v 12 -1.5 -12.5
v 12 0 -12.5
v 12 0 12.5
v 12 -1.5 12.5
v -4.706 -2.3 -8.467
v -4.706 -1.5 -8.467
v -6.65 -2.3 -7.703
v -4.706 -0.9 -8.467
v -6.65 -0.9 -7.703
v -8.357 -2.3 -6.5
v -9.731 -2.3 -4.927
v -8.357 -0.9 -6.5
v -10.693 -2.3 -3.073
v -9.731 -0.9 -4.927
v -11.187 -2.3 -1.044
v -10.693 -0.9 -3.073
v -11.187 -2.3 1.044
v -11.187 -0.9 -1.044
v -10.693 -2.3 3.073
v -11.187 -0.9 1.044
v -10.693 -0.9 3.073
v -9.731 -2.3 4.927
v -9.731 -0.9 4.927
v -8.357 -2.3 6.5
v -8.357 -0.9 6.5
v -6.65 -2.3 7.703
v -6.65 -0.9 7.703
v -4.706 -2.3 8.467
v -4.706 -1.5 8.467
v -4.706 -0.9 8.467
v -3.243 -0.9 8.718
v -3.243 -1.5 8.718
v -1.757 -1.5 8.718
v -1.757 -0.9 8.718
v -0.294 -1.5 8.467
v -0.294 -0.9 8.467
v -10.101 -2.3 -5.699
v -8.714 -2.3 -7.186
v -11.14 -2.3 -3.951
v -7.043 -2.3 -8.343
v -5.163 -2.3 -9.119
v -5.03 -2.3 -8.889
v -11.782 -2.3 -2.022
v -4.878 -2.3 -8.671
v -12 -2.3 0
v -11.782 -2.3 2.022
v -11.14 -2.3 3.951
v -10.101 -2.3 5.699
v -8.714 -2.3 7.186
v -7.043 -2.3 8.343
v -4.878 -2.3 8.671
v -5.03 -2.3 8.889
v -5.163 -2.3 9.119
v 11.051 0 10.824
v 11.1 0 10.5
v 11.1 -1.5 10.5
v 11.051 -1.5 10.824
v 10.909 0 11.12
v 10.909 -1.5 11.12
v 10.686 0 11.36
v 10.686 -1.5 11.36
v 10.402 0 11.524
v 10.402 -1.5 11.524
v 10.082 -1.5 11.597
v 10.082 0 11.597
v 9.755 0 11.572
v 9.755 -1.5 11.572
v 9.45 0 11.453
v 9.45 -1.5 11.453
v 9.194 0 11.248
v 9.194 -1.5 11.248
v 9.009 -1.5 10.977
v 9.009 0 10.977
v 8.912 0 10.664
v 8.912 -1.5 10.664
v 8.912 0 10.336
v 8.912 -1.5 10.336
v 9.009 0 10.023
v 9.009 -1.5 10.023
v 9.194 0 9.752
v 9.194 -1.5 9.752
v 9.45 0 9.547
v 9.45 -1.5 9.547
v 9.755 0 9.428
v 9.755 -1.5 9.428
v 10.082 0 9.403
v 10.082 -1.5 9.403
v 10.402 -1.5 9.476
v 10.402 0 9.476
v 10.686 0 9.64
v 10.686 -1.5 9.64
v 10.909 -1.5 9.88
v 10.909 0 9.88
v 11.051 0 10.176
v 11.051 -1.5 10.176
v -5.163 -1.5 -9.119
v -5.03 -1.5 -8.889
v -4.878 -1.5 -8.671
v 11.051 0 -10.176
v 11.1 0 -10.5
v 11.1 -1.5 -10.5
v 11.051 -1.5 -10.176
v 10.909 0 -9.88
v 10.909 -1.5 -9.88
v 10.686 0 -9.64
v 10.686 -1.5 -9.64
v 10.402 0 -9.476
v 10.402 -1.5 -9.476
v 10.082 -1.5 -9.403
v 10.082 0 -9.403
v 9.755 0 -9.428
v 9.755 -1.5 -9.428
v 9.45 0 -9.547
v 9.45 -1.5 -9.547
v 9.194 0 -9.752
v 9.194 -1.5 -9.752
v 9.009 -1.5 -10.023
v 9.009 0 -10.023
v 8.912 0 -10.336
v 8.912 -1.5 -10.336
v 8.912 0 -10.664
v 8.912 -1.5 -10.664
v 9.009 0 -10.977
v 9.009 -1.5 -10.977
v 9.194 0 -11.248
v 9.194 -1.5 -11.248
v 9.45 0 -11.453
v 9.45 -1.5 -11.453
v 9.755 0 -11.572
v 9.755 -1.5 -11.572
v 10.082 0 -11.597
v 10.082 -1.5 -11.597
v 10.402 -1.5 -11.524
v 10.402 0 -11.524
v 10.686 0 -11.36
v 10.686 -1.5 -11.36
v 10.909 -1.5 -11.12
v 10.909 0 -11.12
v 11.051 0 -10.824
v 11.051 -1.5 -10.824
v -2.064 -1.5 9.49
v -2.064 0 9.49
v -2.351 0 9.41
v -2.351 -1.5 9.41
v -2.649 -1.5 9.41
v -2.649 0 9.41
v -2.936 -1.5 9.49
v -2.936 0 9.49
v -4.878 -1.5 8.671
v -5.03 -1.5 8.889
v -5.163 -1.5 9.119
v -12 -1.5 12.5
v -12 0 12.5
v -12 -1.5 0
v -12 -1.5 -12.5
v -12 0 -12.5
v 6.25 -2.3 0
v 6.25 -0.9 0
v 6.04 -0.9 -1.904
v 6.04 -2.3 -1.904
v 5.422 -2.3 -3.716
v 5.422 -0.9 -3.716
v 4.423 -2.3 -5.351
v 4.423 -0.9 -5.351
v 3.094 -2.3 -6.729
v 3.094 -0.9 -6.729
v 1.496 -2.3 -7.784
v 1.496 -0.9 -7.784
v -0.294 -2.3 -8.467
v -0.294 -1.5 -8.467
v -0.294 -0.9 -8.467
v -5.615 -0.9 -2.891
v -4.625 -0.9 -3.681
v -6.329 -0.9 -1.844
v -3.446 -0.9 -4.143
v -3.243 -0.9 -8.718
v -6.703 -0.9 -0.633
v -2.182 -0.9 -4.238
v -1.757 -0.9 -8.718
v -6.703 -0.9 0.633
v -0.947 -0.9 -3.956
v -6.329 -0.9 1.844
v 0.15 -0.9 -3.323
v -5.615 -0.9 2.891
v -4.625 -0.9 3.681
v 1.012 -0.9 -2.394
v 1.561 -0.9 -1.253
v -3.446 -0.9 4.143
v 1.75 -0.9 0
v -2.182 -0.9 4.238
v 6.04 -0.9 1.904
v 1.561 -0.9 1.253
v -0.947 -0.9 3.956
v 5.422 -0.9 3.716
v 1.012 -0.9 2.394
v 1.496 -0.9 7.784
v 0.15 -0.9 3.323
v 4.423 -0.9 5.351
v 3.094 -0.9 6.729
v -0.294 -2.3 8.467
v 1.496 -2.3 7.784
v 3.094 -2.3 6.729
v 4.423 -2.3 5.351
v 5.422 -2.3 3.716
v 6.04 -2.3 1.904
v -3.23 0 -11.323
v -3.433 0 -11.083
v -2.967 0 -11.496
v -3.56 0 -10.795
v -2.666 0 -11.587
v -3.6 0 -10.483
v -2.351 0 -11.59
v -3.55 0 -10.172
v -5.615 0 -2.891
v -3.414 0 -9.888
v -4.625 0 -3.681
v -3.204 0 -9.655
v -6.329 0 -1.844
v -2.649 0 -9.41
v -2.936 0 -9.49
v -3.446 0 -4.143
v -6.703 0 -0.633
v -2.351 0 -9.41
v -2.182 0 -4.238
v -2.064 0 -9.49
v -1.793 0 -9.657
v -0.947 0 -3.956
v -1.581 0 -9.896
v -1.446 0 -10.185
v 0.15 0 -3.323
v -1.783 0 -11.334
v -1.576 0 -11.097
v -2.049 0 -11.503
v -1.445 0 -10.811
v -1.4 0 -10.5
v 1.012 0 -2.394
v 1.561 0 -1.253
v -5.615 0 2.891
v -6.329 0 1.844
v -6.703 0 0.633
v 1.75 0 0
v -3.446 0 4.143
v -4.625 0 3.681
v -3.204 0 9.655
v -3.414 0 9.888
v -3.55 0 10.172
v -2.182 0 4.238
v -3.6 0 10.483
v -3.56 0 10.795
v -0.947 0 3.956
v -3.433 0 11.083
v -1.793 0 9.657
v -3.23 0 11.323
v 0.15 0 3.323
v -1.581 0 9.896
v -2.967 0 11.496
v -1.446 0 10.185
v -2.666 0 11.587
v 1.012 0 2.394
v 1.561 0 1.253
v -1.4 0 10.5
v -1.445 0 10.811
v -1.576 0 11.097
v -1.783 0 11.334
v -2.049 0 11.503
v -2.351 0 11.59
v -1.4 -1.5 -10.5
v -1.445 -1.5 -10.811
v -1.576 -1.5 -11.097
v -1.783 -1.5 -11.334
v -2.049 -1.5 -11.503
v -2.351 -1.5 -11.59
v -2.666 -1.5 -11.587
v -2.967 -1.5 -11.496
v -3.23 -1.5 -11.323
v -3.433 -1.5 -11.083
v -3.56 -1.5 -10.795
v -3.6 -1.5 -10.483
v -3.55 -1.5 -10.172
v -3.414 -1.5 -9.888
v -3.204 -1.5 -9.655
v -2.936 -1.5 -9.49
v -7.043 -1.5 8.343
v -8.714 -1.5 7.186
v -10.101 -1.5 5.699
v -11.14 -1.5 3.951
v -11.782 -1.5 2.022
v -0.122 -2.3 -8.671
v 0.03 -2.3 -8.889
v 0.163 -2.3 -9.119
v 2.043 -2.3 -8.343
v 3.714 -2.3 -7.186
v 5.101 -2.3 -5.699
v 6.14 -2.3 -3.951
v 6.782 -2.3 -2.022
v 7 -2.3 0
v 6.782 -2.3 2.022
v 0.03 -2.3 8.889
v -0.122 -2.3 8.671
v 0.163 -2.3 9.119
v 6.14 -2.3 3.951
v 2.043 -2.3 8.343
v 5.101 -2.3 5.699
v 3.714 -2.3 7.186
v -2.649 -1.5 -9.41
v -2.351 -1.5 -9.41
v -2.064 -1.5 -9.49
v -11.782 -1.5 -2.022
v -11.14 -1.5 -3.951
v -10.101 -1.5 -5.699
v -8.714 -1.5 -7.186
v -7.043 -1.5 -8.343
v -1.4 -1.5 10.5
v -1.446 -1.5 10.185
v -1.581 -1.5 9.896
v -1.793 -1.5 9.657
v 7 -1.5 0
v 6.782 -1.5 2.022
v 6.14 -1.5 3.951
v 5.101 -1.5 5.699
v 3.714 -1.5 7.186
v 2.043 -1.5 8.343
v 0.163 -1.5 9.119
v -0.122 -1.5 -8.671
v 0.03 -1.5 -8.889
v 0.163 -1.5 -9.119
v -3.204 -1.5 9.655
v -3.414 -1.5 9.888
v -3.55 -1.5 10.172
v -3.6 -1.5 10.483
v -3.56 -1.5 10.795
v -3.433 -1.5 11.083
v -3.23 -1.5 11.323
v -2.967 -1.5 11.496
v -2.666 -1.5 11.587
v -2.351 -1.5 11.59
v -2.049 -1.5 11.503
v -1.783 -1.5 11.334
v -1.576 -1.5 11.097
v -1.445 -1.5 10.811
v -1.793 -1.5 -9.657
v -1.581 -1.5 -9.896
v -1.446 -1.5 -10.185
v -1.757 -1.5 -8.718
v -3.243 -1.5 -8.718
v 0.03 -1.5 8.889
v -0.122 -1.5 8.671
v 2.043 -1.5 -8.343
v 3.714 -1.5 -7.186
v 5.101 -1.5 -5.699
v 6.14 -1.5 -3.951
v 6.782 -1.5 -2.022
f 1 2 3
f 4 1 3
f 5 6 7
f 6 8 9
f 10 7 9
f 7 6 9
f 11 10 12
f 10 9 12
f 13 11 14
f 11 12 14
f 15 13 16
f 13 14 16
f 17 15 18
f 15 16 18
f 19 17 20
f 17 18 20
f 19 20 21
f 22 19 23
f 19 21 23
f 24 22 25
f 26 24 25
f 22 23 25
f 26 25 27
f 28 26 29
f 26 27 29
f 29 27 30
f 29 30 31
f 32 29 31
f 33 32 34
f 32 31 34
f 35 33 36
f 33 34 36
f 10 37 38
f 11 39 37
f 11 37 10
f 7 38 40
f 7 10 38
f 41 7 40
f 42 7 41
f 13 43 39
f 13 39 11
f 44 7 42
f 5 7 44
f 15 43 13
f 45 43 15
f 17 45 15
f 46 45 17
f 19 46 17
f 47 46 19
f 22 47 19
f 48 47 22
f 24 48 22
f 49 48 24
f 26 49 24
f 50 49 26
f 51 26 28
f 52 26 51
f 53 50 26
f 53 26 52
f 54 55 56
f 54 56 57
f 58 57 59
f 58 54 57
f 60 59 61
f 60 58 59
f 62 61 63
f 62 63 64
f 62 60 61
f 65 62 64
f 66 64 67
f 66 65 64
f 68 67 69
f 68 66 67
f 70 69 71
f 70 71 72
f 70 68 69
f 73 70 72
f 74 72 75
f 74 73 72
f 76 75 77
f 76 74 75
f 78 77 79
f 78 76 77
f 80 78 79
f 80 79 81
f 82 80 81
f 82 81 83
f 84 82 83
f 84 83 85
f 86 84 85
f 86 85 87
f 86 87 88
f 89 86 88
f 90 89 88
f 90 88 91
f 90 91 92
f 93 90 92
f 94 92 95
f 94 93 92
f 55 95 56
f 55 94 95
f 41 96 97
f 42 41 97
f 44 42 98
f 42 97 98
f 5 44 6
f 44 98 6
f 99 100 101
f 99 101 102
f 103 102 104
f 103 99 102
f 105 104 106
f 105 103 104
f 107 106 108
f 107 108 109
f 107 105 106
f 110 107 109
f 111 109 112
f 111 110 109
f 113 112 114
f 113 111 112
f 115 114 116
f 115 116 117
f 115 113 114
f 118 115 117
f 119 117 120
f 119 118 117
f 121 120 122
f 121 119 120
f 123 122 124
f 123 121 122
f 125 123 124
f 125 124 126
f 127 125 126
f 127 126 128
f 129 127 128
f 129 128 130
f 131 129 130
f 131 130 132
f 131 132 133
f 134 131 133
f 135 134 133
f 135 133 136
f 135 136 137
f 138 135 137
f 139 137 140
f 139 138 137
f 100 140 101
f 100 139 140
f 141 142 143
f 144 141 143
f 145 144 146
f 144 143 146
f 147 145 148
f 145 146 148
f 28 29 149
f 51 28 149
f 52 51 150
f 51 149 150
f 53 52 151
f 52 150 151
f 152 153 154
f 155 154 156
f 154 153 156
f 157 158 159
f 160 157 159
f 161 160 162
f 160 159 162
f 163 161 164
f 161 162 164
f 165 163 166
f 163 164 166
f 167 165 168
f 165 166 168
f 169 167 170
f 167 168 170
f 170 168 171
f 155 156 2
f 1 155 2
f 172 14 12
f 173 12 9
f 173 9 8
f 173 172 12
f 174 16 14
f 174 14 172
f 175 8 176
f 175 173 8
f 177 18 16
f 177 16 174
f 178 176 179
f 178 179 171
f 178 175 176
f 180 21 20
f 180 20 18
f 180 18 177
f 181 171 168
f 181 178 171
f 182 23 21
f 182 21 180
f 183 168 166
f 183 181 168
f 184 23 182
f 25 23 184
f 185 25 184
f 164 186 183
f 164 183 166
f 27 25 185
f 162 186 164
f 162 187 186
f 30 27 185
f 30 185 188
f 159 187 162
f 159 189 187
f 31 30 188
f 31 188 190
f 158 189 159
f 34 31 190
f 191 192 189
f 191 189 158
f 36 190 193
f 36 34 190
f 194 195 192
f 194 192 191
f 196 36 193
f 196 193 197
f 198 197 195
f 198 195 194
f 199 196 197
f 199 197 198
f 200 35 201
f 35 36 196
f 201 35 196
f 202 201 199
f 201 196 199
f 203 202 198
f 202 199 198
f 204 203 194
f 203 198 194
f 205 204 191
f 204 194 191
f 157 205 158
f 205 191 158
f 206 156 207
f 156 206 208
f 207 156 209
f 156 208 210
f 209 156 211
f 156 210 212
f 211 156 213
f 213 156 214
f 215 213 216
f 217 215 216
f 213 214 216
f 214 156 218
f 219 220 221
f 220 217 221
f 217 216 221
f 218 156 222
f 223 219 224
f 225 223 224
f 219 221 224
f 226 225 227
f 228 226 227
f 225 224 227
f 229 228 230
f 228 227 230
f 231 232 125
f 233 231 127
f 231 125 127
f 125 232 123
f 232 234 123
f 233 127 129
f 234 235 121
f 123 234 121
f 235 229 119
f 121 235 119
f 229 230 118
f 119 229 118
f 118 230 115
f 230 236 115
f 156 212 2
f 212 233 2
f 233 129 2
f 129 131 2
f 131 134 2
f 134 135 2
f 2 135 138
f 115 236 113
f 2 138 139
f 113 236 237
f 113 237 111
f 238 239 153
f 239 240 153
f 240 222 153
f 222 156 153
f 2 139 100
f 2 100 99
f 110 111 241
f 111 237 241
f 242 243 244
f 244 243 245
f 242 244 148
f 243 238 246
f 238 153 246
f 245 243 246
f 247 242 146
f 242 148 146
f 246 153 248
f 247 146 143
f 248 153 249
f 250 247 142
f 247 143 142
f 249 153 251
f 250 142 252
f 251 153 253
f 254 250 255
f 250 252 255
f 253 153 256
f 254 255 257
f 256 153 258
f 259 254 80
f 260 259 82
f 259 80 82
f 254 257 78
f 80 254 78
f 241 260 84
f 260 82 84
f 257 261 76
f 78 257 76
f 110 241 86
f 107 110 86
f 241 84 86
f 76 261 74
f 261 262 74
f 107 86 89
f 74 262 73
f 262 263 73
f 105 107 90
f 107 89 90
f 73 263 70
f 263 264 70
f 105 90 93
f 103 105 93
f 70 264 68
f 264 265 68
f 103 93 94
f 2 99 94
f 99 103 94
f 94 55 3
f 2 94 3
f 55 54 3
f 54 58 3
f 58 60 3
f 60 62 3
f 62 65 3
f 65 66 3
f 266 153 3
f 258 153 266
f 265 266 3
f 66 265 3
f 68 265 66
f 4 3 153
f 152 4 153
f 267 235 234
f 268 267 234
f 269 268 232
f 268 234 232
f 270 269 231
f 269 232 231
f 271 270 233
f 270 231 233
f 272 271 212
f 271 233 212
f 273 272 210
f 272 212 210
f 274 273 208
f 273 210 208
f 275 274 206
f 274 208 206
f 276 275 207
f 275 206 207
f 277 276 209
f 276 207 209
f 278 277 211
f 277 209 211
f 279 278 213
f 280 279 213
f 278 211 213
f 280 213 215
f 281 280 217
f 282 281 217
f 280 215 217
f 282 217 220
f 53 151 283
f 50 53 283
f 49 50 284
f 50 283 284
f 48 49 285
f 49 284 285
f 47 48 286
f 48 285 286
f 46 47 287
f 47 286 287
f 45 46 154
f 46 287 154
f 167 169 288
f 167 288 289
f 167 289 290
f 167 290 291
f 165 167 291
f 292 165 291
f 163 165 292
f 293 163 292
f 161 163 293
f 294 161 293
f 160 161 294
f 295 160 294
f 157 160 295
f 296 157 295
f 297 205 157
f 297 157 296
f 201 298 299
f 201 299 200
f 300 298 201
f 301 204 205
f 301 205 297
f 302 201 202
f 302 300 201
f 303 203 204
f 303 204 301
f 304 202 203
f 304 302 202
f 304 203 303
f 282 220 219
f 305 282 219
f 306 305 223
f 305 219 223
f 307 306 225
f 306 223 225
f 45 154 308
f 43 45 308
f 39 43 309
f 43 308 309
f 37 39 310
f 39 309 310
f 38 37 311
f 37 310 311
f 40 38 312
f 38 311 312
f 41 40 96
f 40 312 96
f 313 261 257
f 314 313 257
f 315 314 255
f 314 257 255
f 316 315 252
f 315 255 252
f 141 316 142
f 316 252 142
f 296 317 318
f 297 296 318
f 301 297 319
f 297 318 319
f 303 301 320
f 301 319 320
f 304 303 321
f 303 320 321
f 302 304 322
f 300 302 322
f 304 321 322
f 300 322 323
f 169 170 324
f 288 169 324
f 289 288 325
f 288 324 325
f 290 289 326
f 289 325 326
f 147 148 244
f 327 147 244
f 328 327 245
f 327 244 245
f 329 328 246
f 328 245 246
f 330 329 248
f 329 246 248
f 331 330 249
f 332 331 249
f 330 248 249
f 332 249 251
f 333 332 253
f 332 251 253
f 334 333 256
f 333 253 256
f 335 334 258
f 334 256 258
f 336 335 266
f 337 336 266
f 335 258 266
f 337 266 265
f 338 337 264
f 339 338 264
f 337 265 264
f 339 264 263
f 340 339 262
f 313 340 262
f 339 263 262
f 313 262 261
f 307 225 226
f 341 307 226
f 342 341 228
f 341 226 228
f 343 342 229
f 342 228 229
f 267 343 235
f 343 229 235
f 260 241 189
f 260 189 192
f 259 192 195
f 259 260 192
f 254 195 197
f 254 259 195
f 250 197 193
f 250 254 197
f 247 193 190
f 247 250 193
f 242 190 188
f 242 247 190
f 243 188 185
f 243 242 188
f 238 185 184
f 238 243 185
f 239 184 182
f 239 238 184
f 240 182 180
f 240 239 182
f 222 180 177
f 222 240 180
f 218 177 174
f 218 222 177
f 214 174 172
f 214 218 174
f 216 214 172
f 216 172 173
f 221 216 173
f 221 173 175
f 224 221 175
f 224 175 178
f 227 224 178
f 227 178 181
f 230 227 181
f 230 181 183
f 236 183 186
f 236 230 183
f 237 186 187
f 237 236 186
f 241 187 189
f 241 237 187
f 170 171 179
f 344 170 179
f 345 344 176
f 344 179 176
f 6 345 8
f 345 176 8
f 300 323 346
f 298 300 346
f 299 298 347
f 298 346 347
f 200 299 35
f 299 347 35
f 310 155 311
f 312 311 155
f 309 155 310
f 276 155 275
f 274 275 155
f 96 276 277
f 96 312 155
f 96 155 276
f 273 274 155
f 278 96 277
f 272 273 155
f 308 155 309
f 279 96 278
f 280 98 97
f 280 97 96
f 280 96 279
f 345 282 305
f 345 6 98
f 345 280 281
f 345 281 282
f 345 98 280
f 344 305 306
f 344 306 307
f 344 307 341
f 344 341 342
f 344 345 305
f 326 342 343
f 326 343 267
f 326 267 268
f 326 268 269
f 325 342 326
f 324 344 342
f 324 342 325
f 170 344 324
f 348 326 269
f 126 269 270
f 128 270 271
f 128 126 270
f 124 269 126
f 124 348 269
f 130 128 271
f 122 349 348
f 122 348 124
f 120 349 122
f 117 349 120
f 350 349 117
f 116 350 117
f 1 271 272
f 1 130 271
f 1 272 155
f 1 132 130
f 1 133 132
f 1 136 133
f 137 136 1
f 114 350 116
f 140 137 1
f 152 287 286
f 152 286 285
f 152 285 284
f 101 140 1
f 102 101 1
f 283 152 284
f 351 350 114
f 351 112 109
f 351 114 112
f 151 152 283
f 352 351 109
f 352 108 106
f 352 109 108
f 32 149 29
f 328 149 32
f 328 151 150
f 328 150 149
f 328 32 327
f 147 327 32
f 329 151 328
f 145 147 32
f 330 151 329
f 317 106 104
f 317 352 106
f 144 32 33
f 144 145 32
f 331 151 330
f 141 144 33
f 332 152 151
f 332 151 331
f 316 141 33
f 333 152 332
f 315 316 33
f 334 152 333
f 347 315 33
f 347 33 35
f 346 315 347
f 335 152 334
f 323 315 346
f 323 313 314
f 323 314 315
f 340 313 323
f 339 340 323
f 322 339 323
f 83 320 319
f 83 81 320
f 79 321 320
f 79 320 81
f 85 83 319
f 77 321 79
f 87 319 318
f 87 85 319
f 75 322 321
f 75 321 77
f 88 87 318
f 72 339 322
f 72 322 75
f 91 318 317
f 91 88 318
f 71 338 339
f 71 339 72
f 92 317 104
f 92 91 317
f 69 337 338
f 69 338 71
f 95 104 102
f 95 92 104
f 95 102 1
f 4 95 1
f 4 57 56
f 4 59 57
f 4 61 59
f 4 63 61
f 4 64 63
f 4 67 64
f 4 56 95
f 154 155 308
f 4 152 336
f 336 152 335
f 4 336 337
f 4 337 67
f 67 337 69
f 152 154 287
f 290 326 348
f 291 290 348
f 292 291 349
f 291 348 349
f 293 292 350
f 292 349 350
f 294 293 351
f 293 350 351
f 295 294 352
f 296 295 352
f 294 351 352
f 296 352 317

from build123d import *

# Parameters (mm, degrees)
F1_DEPTH = 1.5
F0_R     = 1.1
F2_DEPTH = 1.5
F3_DEPTH = 2.3
F0_R_2   = 4.25
F4_DEPTH = 0.9


with BuildPart() as f1:
    # F0 (on Front) → F1 (new body)
    with BuildSketch(Plane.XZ):
        with BuildLine():
            Line((-4.7360679775, 12.5), (-12, 12.5))
            Line((-12, 12.5), (-12, 0))
            ThreePointArc((-12, 0), (-10.101019661, 5.6986401986), (-5.1632631341, 9.119047619))
            ThreePointArc((-5.1632631341, 9.119047619), (-5.476335177, 10.8760703579), (-4.7360679775, 12.5))
        make_face()
    extrude(amount=F1_DEPTH)



with BuildPart() as f1b:
    # F0 (on Front) → F1, piece 2 (new body)
    with BuildSketch(Plane.XZ):
        with BuildLine():
            ThreePointArc((-5.1632631341, -9.119047619), (-10.101019661, -5.6986401986), (-12, 0))
            Line((-12, 0), (-12, -12.5))
            Line((-12, -12.5), (-4.7360679775, -12.5))
            ThreePointArc((-4.7360679775, -12.5), (-5.476335177, -10.8760703579), (-5.1632631341, -9.119047619))
        make_face()
    extrude(amount=F1_DEPTH)


with BuildPart() as f1c:
    # F0 (on Front) → F1, piece 3 (new body)
    with BuildSketch(Plane.XZ):
        with BuildLine():
            Line((12, 12.5), (-0.2639320225, 12.5))
            ThreePointArc((-0.2639320225, 12.5), (0.3025170769, 11.5704662693), (0.5, 10.5))
            ThreePointArc((0.5, 10.5), (0.4146002644, 9.7892923957), (0.1632631341, 9.119047619))
            ThreePointArc((0.1632631341, 9.119047619), (5.101019661, 5.6986401986), (7, 0))
            ThreePointArc((7, 0), (5.101019661, -5.6986401986), (0.1632631341, -9.119047619))
            ThreePointArc((0.1632631341, -9.119047619), (0.4146002644, -9.7892923957), (0.5, -10.5))
            ThreePointArc((0.5, -10.5), (0.3025170769, -11.5704662693), (-0.2639320225, -12.5))
            Line((-0.2639320225, -12.5), (12, -12.5))
            Line((12, -12.5), (12, 12.5))
        make_face()
        with Locations((10, -10.5)):
            Circle(F0_R, mode=Mode.SUBTRACT)
        with Locations((10, 10.5)):
            Circle(F0_R, mode=Mode.SUBTRACT)
    extrude(amount=F1_DEPTH)


with BuildPart() as f1d:
    # F0 (on Front) → F1, piece 4 (new body)
    with BuildSketch(Plane.XZ):
        with BuildLine():
            ThreePointArc((-2.9357751714, 9.49), (-4.0605803478, 9.370943868), (-5.1632631341, 9.119047619))
            ThreePointArc((-5.1632631341, 9.119047619), (-4.956519224, 8.7779334211), (-4.7063489833, 8.4672619048))
            ThreePointArc((-4.7063489833, 8.4672619048), (-2.5, 8.75), (-0.2936510167, 8.4672619048))
            ThreePointArc((-0.2936510167, 8.4672619048), (-0.043480776, 8.7779334211), (0.1632631341, 9.119047619))
            ThreePointArc((0.1632631341, 9.119047619), (-0.9394196522, 9.370943868), (-2.0642248286, 9.49))
            ThreePointArc((-2.0642248286, 9.49), (-2.5, 9.4), (-2.9357751714, 9.49))
        make_face()
    extrude(amount=F1_DEPTH)


with BuildPart() as f1_1:
    add(f1.part)

    add(f1b.part)  # F2 merges F1b

    add(f1c.part)  # F2 merges F1c

    add(f1d.part)  # F2 merges F1d
    # F0 (on Front) → F2 (join)
    with BuildSketch(Plane.XZ):
        with BuildLine():
            Line((12, 12.5), (-0.2639320225, 12.5))
            ThreePointArc((-0.2639320225, 12.5), (0.3025170769, 11.5704662693), (0.5, 10.5))
            ThreePointArc((0.5, 10.5), (0.4146002644, 9.7892923957), (0.1632631341, 9.119047619))
            ThreePointArc((0.1632631341, 9.119047619), (5.101019661, 5.6986401986), (7, 0))
            ThreePointArc((7, 0), (5.101019661, -5.6986401986), (0.1632631341, -9.119047619))
            ThreePointArc((0.1632631341, -9.119047619), (0.4146002644, -9.7892923957), (0.5, -10.5))
            ThreePointArc((0.5, -10.5), (0.3025170769, -11.5704662693), (-0.2639320225, -12.5))
            Line((-0.2639320225, -12.5), (12, -12.5))
            Line((12, -12.5), (12, 12.5))
        make_face()
        with Locations((10, -10.5)):
            Circle(F0_R, mode=Mode.SUBTRACT)
        with Locations((10, 10.5)):
            Circle(F0_R, mode=Mode.SUBTRACT)
        with BuildLine():
            ThreePointArc((-2.9357751714, -9.49), (-4.0605803478, -9.370943868), (-5.1632631341, -9.119047619))
            ThreePointArc((-5.1632631341, -9.119047619), (-5.476335177, -10.8760703579), (-4.7360679775, -12.5))
            Line((-4.7360679775, -12.5), (-0.2639320225, -12.5))
            ThreePointArc((-0.2639320225, -12.5), (0.3025170769, -11.5704662693), (0.5, -10.5))
            ThreePointArc((0.5, -10.5), (0.4146002644, -9.7892923957), (0.1632631341, -9.119047619))
            ThreePointArc((0.1632631341, -9.119047619), (-0.9394196522, -9.370943868), (-2.0642248286, -9.49))
            ThreePointArc((-2.0642248286, -9.49), (-1.5809372468, -9.8955799013), (-1.4, -10.5))
            ThreePointArc((-1.4, -10.5), (-3.1044200987, -11.4190627532), (-2.9357751714, -9.49))
        make_face()
        with BuildLine():
            Line((-0.2639320225, 12.5), (-4.7360679775, 12.5))
            ThreePointArc((-4.7360679775, 12.5), (-5.476335177, 10.8760703579), (-5.1632631341, 9.119047619))
            ThreePointArc((-5.1632631341, 9.119047619), (-4.0605803478, 9.370943868), (-2.9357751714, 9.49))
            ThreePointArc((-2.9357751714, 9.49), (-3.1044200987, 11.4190627532), (-1.4, 10.5))
            ThreePointArc((-1.4, 10.5), (-1.5809372468, 9.8955799013), (-2.0642248286, 9.49))
            ThreePointArc((-2.0642248286, 9.49), (-0.9394196522, 9.370943868), (0.1632631341, 9.119047619))
            ThreePointArc((0.1632631341, 9.119047619), (0.4146002644, 9.7892923957), (0.5, 10.5))
            ThreePointArc((0.5, 10.5), (0.3025170769, 11.5704662693), (-0.2639320225, 12.5))
        make_face()
        with BuildLine():
            ThreePointArc((-4.7063489833, -8.4672619048), (-4.956519224, -8.7779334211), (-5.1632631341, -9.119047619))
            ThreePointArc((-5.1632631341, -9.119047619), (-4.0605803478, -9.370943868), (-2.9357751714, -9.49))
            ThreePointArc((-2.9357751714, -9.49), (-2.5, -9.4), (-2.0642248286, -9.49))
            ThreePointArc((-2.0642248286, -9.49), (-0.9394196522, -9.370943868), (0.1632631341, -9.119047619))
            ThreePointArc((0.1632631341, -9.119047619), (-0.043480776, -8.7779334211), (-0.2936510167, -8.4672619048))
            ThreePointArc((-0.2936510167, -8.4672619048), (-2.5, -8.75), (-4.7063489833, -8.4672619048))
        make_face()
    extrude(amount=F2_DEPTH)

    # F0 (on Front) → F3 (join)
    with BuildSketch(Plane.XZ):
        with BuildLine():
            ThreePointArc((-5.1632631341, 9.119047619), (-10.101019661, 5.6986401986), (-12, 0))
            ThreePointArc((-12, 0), (-10.101019661, -5.6986401986), (-5.1632631341, -9.119047619))
            ThreePointArc((-5.1632631341, -9.119047619), (-4.956519224, -8.7779334211), (-4.7063489833, -8.4672619048))
            ThreePointArc((-4.7063489833, -8.4672619048), (-11.25, 0), (-4.7063489833, 8.4672619048))
            ThreePointArc((-4.7063489833, 8.4672619048), (-4.956519224, 8.7779334211), (-5.1632631341, 9.119047619))
        make_face()
        with BuildLine():
            ThreePointArc((7, 0), (5.101019661, 5.6986401986), (0.1632631341, 9.119047619))
            ThreePointArc((0.1632631341, 9.119047619), (-0.043480776, 8.7779334211), (-0.2936510167, 8.4672619048))
            ThreePointArc((-0.2936510167, 8.4672619048), (4.4234403877, 5.3505582137), (6.25, 0))
            ThreePointArc((6.25, 0), (4.4234403877, -5.3505582137), (-0.2936510167, -8.4672619048))
            ThreePointArc((-0.2936510167, -8.4672619048), (-0.043480776, -8.7779334211), (0.1632631341, -9.119047619))
            ThreePointArc((0.1632631341, -9.119047619), (5.101019661, -5.6986401986), (7, 0))
        make_face()
    extrude(amount=F3_DEPTH)

    # F0 (on Front) → F4 (join)
    with BuildSketch(Plane.XZ):
        with BuildLine():
            ThreePointArc((-0.2936510167, 8.4672619048), (-2.5, 7.5), (-4.7063489833, 8.4672619048))
            ThreePointArc((-4.7063489833, 8.4672619048), (-11.25, 0), (-4.7063489833, -8.4672619048))
            ThreePointArc((-4.7063489833, -8.4672619048), (-2.5, -7.5), (-0.2936510167, -8.4672619048))
            ThreePointArc((-0.2936510167, -8.4672619048), (4.4234403877, -5.3505582137), (6.25, 0))
            ThreePointArc((6.25, 0), (4.4234403877, 5.3505582137), (-0.2936510167, 8.4672619048))
        make_face()
        with Locations((-2.5, 0)):
            Circle(F0_R_2, mode=Mode.SUBTRACT)
        with BuildLine():
            ThreePointArc((-0.2936510167, 8.4672619048), (-2.5, 8.75), (-4.7063489833, 8.4672619048))
            ThreePointArc((-4.7063489833, 8.4672619048), (-2.5, 7.5), (-0.2936510167, 8.4672619048))
        make_face()
        with BuildLine():
            ThreePointArc((-0.2936510167, -8.4672619048), (-2.5, -7.5), (-4.7063489833, -8.4672619048))
            ThreePointArc((-4.7063489833, -8.4672619048), (-2.5, -8.75), (-0.2936510167, -8.4672619048))
        make_face()
    extrude(amount=F4_DEPTH)


solid = f1_1.part
